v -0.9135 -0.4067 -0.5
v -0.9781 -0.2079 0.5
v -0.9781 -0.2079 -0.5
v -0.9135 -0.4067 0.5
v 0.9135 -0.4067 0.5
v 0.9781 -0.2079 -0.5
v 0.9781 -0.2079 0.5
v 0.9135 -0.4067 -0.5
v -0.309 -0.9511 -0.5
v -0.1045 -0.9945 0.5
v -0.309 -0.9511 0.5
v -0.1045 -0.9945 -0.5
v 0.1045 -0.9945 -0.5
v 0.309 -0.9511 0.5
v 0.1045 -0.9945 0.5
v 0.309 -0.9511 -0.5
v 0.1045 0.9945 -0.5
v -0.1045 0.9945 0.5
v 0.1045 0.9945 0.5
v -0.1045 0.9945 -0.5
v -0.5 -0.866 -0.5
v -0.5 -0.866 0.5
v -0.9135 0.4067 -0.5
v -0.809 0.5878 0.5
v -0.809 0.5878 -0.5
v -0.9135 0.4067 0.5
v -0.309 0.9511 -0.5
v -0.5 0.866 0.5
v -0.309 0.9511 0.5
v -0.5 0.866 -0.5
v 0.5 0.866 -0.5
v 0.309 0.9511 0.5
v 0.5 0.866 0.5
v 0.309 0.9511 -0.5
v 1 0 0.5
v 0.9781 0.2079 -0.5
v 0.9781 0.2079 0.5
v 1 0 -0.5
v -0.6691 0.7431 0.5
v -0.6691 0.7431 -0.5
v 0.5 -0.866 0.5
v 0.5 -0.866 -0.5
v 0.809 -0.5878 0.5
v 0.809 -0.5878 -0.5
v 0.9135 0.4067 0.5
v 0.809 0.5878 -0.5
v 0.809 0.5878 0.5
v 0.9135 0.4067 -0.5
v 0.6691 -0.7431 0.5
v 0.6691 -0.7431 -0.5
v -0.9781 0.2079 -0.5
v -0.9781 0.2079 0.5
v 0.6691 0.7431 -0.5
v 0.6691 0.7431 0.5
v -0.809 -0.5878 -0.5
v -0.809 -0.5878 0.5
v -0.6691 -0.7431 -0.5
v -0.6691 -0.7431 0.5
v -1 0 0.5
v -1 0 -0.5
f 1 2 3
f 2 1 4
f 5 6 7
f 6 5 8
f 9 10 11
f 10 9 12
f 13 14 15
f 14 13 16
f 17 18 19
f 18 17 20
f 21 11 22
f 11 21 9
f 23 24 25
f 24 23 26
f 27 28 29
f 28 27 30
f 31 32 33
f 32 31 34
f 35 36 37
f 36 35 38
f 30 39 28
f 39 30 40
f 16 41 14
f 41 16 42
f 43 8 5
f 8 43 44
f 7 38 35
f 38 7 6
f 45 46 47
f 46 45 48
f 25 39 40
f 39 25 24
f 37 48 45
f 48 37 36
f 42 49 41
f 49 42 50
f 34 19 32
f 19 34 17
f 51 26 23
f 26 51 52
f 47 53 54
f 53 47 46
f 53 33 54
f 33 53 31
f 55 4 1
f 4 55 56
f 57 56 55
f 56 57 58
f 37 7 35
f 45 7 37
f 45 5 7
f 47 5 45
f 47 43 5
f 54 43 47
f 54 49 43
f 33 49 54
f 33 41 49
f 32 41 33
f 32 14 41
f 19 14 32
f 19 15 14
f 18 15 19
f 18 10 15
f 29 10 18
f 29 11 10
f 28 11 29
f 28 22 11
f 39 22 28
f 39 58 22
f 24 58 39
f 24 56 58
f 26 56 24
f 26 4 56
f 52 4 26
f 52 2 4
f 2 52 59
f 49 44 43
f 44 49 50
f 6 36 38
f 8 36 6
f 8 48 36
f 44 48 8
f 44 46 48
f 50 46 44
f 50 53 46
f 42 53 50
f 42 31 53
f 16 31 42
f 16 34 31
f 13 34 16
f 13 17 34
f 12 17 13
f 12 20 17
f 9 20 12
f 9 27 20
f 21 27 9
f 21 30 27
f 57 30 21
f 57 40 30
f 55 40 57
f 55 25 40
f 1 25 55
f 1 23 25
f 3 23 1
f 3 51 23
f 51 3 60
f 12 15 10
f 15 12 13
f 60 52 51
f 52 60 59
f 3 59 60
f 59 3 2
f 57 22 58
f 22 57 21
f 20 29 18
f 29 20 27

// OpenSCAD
// file: IKEA Skadis v2 hook cutouts.scad
skadis_hook_width = 4.5;
skadis_hook_height = 46;
skadis_hole_spacing_width = 40; // middle to middle
cutout_tolerance_w = 0.4;
cutout_tolerance_h = 0.6;


module skadis_hook_cutout(center=false, hook_count=2) {
    
    if(center) {
        translate([-(skadis_hole_spacing_width + skadis_hook_width) / 2, 0, - skadis_hook_height / 2])
        object(hook_count);
    } else {
        object();
    }
    

}

module object(hook_count=2) {
    union() {

        // Cutout for the hook 1
        color("red")
        translate([- cutout_tolerance_w / 2, 0, - cutout_tolerance_h / 2])
        cube([skadis_hook_width + cutout_tolerance_w, 2, skadis_hook_height + cutout_tolerance_h]);

        // Cutout for the hook 2
        color("red")
        translate([- cutout_tolerance_w / 2 + skadis_hole_spacing_width, 0, - cutout_tolerance_h / 2])
        cube([skadis_hook_width + cutout_tolerance_w, 2, skadis_hook_height + cutout_tolerance_h]);

    }
}

skadis_hook_cutout(center = false);
// file: ../../../modules/scad/roundedcube.scad
// More information: https://danielupshaw.com/openscad-rounded-corners/


// Examples
// color("Yellow")
// roundedcube(3, true, 0.7, "xmin");

// translate(v = [1, 0, 2])
// color("Pink")
// roundedcube([4, 2, 2], false, 0.6, "zmax");

// translate(v = [-4, -1, 2])
// color("Lightblue")
// roundedcube(2, false);

// translate(v = [0, 0, 6])
// color("Orange")
// roundedcube([3, 2, 2], true, 0.2);

// translate(v = [2.5, -0.5, 5])
// color("Green")
// roundedcube([3, 2, 2], false, 0.4, "z");

// Set to 0.01 for higher definition curves (renders slower)
$fs = 0.15;

module roundedcube(size = [1, 1, 1], center = false, radius = 0.5, apply_to = "all") {
	// If single value, convert to [x, y, z] vector
	size = (size[0] == undef) ? [size, size, size] : size;

	translate_min = radius;
	translate_xmax = size[0] - radius;
	translate_ymax = size[1] - radius;
	translate_zmax = size[2] - radius;

	diameter = radius * 2;

	obj_translate = (center == false) ?
		[0, 0, 0] : [
			-(size[0] / 2),
			-(size[1] / 2),
			-(size[2] / 2)
		];

	translate(v = obj_translate) {
		hull() {
			for (translate_x = [translate_min, translate_xmax]) {
				x_at = (translate_x == translate_min) ? "min" : "max";
				for (translate_y = [translate_min, translate_ymax]) {
					y_at = (translate_y == translate_min) ? "min" : "max";
					for (translate_z = [translate_min, translate_zmax]) {
						z_at = (translate_z == translate_min) ? "min" : "max";

						translate(v = [translate_x, translate_y, translate_z])
						if (
							(apply_to == "all") ||
							(apply_to == "xmin" && x_at == "min") || (apply_to == "xmax" && x_at == "max") ||
							(apply_to == "ymin" && y_at == "min") || (apply_to == "ymax" && y_at == "max") ||
							(apply_to == "zmin" && z_at == "min") || (apply_to == "zmax" && z_at == "max")
						) {
							sphere(r = radius);
						} else {
							rotate = 
								(apply_to == "xmin" || apply_to == "xmax" || apply_to == "x") ? [0, 90, 0] : (
								(apply_to == "ymin" || apply_to == "ymax" || apply_to == "y") ? [90, 90, 0] :
								[0, 0, 0]
							);
							rotate(a = rotate)
							cylinder(h = diameter, r = radius, center = true);
						}
					}
				}
			}
		}
	}
}
// file: ../modules/roundedcube.scad
// More information: https://danielupshaw.com/openscad-rounded-corners/


// Examples
// color("Yellow")
// roundedcube(3, true, 0.7, "xmin");

// translate(v = [1, 0, 2])
// color("Pink")
// roundedcube([4, 2, 2], false, 0.6, "zmax");

// translate(v = [-4, -1, 2])
// color("Lightblue")
// roundedcube(2, false);

// translate(v = [0, 0, 6])
// color("Orange")
// roundedcube([3, 2, 2], true, 0.2);

// translate(v = [2.5, -0.5, 5])
// color("Green")
// roundedcube([3, 2, 2], false, 0.4, "z");

// Set to 0.01 for higher definition curves (renders slower)
$fs = 0.15;

module roundedcube(size = [1, 1, 1], center = false, radius = 0.5, apply_to = "all") {
	// If single value, convert to [x, y, z] vector
	size = (size[0] == undef) ? [size, size, size] : size;

	translate_min = radius;
	translate_xmax = size[0] - radius;
	translate_ymax = size[1] - radius;
	translate_zmax = size[2] - radius;

	diameter = radius * 2;

	obj_translate = (center == false) ?
		[0, 0, 0] : [
			-(size[0] / 2),
			-(size[1] / 2),
			-(size[2] / 2)
		];

	translate(v = obj_translate) {
		hull() {
			for (translate_x = [translate_min, translate_xmax]) {
				x_at = (translate_x == translate_min) ? "min" : "max";
				for (translate_y = [translate_min, translate_ymax]) {
					y_at = (translate_y == translate_min) ? "min" : "max";
					for (translate_z = [translate_min, translate_zmax]) {
						z_at = (translate_z == translate_min) ? "min" : "max";

						translate(v = [translate_x, translate_y, translate_z])
						if (
							(apply_to == "all") ||
							(apply_to == "xmin" && x_at == "min") || (apply_to == "xmax" && x_at == "max") ||
							(apply_to == "ymin" && y_at == "min") || (apply_to == "ymax" && y_at == "max") ||
							(apply_to == "zmin" && z_at == "min") || (apply_to == "zmax" && z_at == "max")
						) {
							sphere(r = radius);
						} else {
							rotate = 
								(apply_to == "xmin" || apply_to == "xmax" || apply_to == "x") ? [0, 90, 0] : (
								(apply_to == "ymin" || apply_to == "ymax" || apply_to == "y") ? [90, 90, 0] :
								[0, 0, 0]
							);
							rotate(a = rotate)
							cylinder(h = diameter, r = radius, center = true);
						}
					}
				}
			}
		}
	}
}
// file: IKEA Skadis v2 Bin.scad
_width = 60 + 1.6 + 1.6;
_depth = 60 + 1.6 + 1.6;
_height = 100;
_thickness = 1.6;  //Recommended minimum 1.6

//use <./IKEA Skadis include backwall with 3 hooks.scad>
use <../../../modules/scad/roundedcube.scad>
use <./IKEA Skadis v2 hook cutouts.scad>



module bin(_w, _d, _h, _t, _r) {

    difference() {
        translate([0, _d / 2, 0])
        difference() {
            roundedcube(size = [_w, _d, _h], center = true, radius = _r, apply_to = "z");
            color("red")
            translate([0, 0, _t])
            roundedcube(size = [_w - _t * 2, _d - _t * 2, _h - _t * 2 + 1], center = true, radius = _r, apply_to = "z");
        }
        color("green")
        translate([0, -1.4, 0])
        skadis_hook_cutout(center=true, 3);
    }
}

bin(_width, _depth, _height, _thickness, 5);
// main file
_width = 130;
_depth = 45;
_height = 59;
_thickness = 1.6; //Recommended minimum 1.6

_bottom_cutout = 1;
_bottom_cutout_width = 103;
_bottom_cutout_depth = 20;

_right_cutout = 0;
_right_cutout_depth = 13;
_right_cutout_height = 20;
_right_cutout_z_offset = 30; // (_height - _left_cutout_height) / 2
_right_cutout_y_offset = 20; // (_depth - _left_cutout_depth) / 2

_left_cutout = 1;
_left_cutout_depth = 13; //16
_left_cutout_height = 20;
_left_cutout_z_offset = 30; // (_height - _right_cutout_height) / 2
_left_cutout_y_offset = 20; // (_depth - _left_cutout_depth) / 2

_front_cutout = 1;
_front_cutout_width = 50;
_front_cutout_height = 50;
_front_cutout_z_offset = 17; // Middle = (_height - _front_cutout_height) / 2;

use <./IKEA Skadis v2 Bin.scad>
use <../modules/roundedcube.scad>

difference() {
    translate([_width / 2, 0, _height / 2])
    bin(_width, _depth, _height, _thickness);

    // Bottom cutout
    if(_bottom_cutout == 1) {
        translate([(_width - _bottom_cutout_width) / 2, (_depth - _bottom_cutout_depth) / 2, -1])
        //cube([_bottom_cutout_width, _bottom_cutout_depth, _thickness + 2]);
        roundedcube(size = [_bottom_cutout_width, _bottom_cutout_depth, _thickness + 2], center = false, radius = 5, apply_to = "z");
    }

    // Right cutout
    if(_right_cutout == 1) {
        translate([_width - _thickness - 1, _depth - _right_cutout_depth - _right_cutout_y_offset, _left_cutout_z_offset])
        roundedcube(size = [_thickness + 2, _right_cutout_depth, _right_cutout_height], center = false, radius = 2.5, apply_to = "x");
    }

    // Left cutout
    if(_left_cutout == 1) {
        translate([- 1, _depth - _left_cutout_depth - _left_cutout_y_offset, _left_cutout_z_offset])
        roundedcube(size = [_thickness + 2, _left_cutout_depth, _left_cutout_height], center = false, radius = 2.5, apply_to = "x");
    }

    // Front cutout
    if(_front_cutout == 1) {
        color("red")
        translate([(_width - _front_cutout_width) / 2, _depth -1, _front_cutout_z_offset])
        //cube([_bottom_cutout_width, _bottom_cutout_depth, _thickness + 2]);
        roundedcube(size = [_front_cutout_width, _thickness, _front_cutout_height], center = false, radius = 5, apply_to = "y");
    }
}

// color("pink")
// translate([3, 2, 2])
// cube([124, 39, 74]);
